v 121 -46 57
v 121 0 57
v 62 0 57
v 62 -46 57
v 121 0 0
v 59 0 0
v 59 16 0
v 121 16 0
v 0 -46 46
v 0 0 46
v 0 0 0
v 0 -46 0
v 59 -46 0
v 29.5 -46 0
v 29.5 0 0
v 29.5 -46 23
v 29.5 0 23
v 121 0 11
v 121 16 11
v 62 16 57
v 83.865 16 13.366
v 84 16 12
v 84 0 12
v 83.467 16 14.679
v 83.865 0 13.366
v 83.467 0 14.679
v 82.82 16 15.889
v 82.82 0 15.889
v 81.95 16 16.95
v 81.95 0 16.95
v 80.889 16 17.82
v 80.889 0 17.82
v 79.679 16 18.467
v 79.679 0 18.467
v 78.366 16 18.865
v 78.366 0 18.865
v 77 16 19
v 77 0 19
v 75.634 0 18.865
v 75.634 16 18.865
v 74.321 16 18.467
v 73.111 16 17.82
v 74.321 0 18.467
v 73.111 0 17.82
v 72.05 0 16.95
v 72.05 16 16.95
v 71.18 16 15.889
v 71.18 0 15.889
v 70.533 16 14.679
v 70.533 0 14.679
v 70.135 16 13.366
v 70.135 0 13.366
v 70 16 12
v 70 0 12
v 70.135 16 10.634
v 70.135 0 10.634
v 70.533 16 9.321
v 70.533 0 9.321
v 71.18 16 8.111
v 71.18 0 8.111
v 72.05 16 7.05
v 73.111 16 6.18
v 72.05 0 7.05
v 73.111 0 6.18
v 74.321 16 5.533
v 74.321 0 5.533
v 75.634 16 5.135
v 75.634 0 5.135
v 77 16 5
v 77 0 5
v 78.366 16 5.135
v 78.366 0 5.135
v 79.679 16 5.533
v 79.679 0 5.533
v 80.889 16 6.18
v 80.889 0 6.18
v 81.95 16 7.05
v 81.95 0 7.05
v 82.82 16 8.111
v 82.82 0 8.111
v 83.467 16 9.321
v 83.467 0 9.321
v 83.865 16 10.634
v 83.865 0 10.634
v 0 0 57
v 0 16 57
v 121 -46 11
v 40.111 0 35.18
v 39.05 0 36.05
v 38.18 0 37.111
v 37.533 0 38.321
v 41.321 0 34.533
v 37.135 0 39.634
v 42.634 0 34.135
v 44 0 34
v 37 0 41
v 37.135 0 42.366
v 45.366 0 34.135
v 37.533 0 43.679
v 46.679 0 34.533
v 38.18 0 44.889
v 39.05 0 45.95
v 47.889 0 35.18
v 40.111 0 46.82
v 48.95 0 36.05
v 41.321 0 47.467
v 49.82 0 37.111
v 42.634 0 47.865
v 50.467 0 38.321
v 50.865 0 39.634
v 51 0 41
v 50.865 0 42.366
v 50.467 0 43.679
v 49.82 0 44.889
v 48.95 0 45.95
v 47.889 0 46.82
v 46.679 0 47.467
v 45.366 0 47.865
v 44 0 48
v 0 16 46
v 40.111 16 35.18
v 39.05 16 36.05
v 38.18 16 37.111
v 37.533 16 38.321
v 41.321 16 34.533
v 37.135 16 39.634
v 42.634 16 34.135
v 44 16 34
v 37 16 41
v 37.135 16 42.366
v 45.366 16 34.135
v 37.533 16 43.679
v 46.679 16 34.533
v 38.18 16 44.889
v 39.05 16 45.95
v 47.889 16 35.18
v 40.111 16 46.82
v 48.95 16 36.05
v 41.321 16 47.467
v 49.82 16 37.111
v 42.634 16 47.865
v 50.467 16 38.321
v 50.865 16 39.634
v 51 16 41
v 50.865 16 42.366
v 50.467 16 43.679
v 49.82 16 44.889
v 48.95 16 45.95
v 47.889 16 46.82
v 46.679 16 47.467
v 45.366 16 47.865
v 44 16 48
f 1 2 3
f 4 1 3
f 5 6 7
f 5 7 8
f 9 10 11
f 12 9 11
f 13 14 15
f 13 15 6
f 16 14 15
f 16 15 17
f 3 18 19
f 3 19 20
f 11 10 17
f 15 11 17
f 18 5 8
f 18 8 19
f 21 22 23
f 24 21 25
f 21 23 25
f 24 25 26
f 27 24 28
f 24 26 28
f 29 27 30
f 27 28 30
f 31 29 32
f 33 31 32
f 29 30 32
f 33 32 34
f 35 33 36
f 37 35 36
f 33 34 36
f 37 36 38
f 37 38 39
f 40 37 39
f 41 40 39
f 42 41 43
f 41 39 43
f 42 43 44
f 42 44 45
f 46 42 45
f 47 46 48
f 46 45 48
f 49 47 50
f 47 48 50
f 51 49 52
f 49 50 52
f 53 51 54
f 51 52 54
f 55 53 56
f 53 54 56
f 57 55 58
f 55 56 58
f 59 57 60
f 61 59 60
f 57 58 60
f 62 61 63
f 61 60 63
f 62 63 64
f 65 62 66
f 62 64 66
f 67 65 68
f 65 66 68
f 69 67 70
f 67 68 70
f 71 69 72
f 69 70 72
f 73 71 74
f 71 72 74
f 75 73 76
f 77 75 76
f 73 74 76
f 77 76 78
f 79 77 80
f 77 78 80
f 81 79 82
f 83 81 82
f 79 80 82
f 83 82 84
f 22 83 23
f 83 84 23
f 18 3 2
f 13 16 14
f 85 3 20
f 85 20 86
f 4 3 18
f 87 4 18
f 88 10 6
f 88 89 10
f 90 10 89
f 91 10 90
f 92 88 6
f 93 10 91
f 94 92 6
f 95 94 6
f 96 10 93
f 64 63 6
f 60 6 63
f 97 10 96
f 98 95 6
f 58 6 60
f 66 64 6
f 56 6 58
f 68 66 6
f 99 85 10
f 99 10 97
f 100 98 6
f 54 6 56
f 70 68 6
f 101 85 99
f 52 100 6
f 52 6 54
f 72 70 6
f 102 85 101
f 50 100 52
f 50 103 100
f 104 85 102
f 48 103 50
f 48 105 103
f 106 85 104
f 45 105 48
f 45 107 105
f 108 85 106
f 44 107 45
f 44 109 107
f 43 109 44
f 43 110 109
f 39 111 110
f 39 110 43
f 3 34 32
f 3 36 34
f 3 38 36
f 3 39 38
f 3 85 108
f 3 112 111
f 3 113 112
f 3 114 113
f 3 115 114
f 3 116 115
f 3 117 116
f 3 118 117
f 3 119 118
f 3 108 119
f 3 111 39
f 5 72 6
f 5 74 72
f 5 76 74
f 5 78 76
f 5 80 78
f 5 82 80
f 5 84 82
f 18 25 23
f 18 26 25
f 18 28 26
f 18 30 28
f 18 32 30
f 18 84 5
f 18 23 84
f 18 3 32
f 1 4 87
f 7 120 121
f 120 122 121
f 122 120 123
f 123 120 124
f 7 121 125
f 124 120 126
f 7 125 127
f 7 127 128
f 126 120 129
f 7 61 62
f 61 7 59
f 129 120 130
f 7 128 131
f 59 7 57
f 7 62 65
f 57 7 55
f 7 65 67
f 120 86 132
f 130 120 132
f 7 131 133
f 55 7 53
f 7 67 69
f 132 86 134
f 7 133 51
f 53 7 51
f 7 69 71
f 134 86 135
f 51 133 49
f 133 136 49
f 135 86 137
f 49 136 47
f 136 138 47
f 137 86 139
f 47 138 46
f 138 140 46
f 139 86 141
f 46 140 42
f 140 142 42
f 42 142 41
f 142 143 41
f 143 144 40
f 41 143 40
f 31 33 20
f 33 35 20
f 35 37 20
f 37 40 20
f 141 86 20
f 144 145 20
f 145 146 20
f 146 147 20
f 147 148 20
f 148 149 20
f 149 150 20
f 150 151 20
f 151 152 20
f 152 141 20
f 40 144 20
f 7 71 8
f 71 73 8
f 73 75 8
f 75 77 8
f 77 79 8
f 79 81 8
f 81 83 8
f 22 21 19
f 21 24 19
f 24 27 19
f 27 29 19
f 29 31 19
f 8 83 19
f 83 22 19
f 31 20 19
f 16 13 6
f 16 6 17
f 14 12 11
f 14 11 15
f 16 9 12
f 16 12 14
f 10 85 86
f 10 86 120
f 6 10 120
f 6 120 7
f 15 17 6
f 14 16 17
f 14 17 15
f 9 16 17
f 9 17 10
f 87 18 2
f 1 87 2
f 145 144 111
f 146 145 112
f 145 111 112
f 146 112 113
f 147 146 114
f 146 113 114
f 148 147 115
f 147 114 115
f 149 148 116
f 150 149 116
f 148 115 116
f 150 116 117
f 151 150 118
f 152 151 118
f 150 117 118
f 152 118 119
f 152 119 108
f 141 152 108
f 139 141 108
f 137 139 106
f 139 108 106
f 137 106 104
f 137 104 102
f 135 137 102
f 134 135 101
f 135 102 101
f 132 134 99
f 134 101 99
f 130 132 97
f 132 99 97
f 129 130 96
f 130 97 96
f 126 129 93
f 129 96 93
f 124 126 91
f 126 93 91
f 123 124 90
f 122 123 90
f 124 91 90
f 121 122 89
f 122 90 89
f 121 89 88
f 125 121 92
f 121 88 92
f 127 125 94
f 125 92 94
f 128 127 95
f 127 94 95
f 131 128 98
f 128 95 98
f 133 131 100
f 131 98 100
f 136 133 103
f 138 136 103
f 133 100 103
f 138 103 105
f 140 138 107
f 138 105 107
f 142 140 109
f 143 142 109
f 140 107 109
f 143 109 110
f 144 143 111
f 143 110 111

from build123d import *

# Parameters (mm, degrees)
F1_DEPTH = 46
F2_DEPTH = 46
F0_R     = 7
F3_DEPTH = 16
F4_DEPTH = 46


with BuildPart() as f1:
    # F0 (on Front) → F1 (new body)
    with BuildSketch(Plane.XZ):
        Polygon((121, 57), (62, 57), (121, 11), align=None)
    extrude(amount=F1_DEPTH)


with BuildPart() as f2:
    # F0 (on Front) → F2 (new body)
    with BuildSketch(Plane.XZ):
        Polygon((0, 46), (0, 0), (29.5, 0), (29.5, 23), align=None)
    extrude(amount=F2_DEPTH)


with BuildPart() as f3:
    # F0 (on Front) → F3 (new body)
    with BuildSketch(Plane.XZ):
        Polygon((0, 57), (0, 46), (29.5, 23), (59, 0), (121, 0), (121, 11), (62, 57), align=None)
        with Locations((77, 12)):
            Circle(F0_R, mode=Mode.SUBTRACT)
        with Locations((44, 41)):
            Circle(F0_R, mode=Mode.SUBTRACT)
    extrude(amount=-F3_DEPTH)


with BuildPart() as f4:
    # F0 (on Front) → F4 (new body)
    with BuildSketch(Plane.XZ):
        Polygon((29.5, 23), (29.5, 0), (59, 0), align=None)
    extrude(amount=F4_DEPTH)


solid = Compound([f1.part, f2.part, f3.part, f4.part])
